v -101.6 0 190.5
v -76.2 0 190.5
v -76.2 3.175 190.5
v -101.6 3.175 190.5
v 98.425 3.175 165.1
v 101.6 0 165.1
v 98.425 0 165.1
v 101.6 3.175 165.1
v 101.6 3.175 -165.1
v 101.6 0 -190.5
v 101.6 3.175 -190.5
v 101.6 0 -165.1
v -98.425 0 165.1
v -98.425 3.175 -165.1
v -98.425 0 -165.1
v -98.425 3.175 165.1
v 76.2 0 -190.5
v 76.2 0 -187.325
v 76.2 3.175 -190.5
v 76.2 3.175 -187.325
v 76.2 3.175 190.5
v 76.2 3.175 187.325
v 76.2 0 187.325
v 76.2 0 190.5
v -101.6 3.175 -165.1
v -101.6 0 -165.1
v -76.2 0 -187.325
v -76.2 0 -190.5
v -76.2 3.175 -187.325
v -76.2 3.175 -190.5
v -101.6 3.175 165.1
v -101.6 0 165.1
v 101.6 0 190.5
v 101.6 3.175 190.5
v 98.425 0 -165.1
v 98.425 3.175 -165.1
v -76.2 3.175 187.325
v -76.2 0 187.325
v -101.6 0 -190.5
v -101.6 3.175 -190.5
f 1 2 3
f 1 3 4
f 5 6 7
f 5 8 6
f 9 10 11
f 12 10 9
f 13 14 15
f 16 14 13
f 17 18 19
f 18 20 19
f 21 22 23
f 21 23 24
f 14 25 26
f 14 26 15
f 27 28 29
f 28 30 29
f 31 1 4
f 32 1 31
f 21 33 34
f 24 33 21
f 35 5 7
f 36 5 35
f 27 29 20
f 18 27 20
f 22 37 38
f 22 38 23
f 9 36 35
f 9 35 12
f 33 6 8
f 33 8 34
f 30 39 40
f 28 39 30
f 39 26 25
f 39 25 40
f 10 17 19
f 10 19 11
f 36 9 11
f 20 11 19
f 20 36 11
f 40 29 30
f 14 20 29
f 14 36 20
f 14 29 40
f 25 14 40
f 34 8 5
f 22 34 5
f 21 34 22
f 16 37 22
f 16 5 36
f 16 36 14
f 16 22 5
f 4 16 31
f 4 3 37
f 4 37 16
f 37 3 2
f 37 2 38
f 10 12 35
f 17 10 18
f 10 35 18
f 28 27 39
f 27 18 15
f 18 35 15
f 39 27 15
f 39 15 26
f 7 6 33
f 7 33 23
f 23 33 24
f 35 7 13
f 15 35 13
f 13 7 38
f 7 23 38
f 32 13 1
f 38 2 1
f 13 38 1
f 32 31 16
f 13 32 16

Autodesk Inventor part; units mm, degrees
ref_plane "YZ Plane" through (0, 0, 0) normal (1, 0, 0) x (0, 1, 0)
ref_plane "XZ Plane" through (0, 0, 0) normal (0, 1, 0) x (-1, 0, 0)
ref_plane "XY Plane" through (0, 0, 0) normal (0, 0, 1) x (1, 0, 0)
sketch "Sketch1" plane through (0, 0, 0) normal (0, 1, 0) x (-1, 0, 0)
  line L0 (-101.6, 190.5) -> (101.6, 190.5)
  line L1 (101.6, 190.5) -> (101.6, -190.5)
  line L2 (101.6, -190.5) -> (-101.6, -190.5)
  line L3 (-101.6, -190.5) -> (-101.6, 190.5)
  line L4 (-101.6, 190.5) -> (101.6, -190.5) construction
  line L5 (101.6, 190.5) -> (-101.6, -190.5) construction
  point P0 (0, 0)
  dimension "d0" = 203.2
  dimension "d1" = 381
extrude "Extrusion1" add sketch "Sketch1" along normal blind 3.175
sketch "Sketch2" plane through (0, 3.175, 0) normal (0, 1, 0) x (1, 0, 0)
  line L0 (-76.2, -190.5) -> (-76.2, -187.325)
  line L1 (-101.6, -165.1) -> (-98.425, -165.1)
  line L2 (-98.425, -165.1) -> (-98.425, 0)
  line L3 (-76.2, -187.325) -> (0, -187.325)
  line L4 (-101.6, 190.5) -> (-101.6, 165.1)
  line L5 (-101.6, 165.1) -> (-98.425, 165.1)
  line L6 (-98.425, 165.1) -> (-98.425, 0)
  line L7 (-101.6, 190.5) -> (-76.2, 190.5)
  line L8 (0, -187.325) -> (76.2, -187.325)
  line L9 (76.2, -187.325) -> (76.2, -190.5)
  line L10 (101.6, -190.5) -> (101.6, -165.1)
  line L11 (101.6, -190.5) -> (101.6, 190.5) projected
  line L12 (101.6, -165.1) -> (98.425, -165.1)
  line L13 (98.425, -165.1) -> (98.425, 165.1)
  line L14 (98.425, 165.1) -> (101.6, 165.1)
  line L15 (-76.2, 190.5) -> (-76.2, 187.325)
  line L16 (-76.2, 187.325) -> (76.2, 187.325)
  line L17 (76.2, 187.325) -> (76.2, 190.5)
  line L18 (76.2, 190.5) -> (-76.2, 190.5)
  line L19 (101.6, -165.1) -> (142.875, -125.4125)
  line L20 (142.875, -125.4125) -> (138.1125, 114.3)
  line L21 (138.1125, 114.3) -> (101.6, 165.1)
  line L22 (-76.2, -190.5) -> (66.675, -207.9625)
  line L23 (66.675, -207.9625) -> (76.2, -190.5)
  line L24 (-101.6, -165.1) -> (-173.0375, -100.0125)
  line L25 (-173.0375, -100.0125) -> (-152.4, 165.1)
  line L26 (-152.4, 165.1) -> (-101.6, 165.1)
  point P0 (-101.6, -190.5)
  dimension "d5" = 25.4
  dimension "d6" = 76.2
  dimension "d7" = 180
extrude "Extrusion2" cut sketch "Sketch2" against normal blind 3.175 contours L0 L3 L8 L9 L23 L22 | L24 L25 L26 L5 L6 L2 L1 | L18 L17 L16 L15 | L12 L13 L14 L11
properties part number "bottom"
